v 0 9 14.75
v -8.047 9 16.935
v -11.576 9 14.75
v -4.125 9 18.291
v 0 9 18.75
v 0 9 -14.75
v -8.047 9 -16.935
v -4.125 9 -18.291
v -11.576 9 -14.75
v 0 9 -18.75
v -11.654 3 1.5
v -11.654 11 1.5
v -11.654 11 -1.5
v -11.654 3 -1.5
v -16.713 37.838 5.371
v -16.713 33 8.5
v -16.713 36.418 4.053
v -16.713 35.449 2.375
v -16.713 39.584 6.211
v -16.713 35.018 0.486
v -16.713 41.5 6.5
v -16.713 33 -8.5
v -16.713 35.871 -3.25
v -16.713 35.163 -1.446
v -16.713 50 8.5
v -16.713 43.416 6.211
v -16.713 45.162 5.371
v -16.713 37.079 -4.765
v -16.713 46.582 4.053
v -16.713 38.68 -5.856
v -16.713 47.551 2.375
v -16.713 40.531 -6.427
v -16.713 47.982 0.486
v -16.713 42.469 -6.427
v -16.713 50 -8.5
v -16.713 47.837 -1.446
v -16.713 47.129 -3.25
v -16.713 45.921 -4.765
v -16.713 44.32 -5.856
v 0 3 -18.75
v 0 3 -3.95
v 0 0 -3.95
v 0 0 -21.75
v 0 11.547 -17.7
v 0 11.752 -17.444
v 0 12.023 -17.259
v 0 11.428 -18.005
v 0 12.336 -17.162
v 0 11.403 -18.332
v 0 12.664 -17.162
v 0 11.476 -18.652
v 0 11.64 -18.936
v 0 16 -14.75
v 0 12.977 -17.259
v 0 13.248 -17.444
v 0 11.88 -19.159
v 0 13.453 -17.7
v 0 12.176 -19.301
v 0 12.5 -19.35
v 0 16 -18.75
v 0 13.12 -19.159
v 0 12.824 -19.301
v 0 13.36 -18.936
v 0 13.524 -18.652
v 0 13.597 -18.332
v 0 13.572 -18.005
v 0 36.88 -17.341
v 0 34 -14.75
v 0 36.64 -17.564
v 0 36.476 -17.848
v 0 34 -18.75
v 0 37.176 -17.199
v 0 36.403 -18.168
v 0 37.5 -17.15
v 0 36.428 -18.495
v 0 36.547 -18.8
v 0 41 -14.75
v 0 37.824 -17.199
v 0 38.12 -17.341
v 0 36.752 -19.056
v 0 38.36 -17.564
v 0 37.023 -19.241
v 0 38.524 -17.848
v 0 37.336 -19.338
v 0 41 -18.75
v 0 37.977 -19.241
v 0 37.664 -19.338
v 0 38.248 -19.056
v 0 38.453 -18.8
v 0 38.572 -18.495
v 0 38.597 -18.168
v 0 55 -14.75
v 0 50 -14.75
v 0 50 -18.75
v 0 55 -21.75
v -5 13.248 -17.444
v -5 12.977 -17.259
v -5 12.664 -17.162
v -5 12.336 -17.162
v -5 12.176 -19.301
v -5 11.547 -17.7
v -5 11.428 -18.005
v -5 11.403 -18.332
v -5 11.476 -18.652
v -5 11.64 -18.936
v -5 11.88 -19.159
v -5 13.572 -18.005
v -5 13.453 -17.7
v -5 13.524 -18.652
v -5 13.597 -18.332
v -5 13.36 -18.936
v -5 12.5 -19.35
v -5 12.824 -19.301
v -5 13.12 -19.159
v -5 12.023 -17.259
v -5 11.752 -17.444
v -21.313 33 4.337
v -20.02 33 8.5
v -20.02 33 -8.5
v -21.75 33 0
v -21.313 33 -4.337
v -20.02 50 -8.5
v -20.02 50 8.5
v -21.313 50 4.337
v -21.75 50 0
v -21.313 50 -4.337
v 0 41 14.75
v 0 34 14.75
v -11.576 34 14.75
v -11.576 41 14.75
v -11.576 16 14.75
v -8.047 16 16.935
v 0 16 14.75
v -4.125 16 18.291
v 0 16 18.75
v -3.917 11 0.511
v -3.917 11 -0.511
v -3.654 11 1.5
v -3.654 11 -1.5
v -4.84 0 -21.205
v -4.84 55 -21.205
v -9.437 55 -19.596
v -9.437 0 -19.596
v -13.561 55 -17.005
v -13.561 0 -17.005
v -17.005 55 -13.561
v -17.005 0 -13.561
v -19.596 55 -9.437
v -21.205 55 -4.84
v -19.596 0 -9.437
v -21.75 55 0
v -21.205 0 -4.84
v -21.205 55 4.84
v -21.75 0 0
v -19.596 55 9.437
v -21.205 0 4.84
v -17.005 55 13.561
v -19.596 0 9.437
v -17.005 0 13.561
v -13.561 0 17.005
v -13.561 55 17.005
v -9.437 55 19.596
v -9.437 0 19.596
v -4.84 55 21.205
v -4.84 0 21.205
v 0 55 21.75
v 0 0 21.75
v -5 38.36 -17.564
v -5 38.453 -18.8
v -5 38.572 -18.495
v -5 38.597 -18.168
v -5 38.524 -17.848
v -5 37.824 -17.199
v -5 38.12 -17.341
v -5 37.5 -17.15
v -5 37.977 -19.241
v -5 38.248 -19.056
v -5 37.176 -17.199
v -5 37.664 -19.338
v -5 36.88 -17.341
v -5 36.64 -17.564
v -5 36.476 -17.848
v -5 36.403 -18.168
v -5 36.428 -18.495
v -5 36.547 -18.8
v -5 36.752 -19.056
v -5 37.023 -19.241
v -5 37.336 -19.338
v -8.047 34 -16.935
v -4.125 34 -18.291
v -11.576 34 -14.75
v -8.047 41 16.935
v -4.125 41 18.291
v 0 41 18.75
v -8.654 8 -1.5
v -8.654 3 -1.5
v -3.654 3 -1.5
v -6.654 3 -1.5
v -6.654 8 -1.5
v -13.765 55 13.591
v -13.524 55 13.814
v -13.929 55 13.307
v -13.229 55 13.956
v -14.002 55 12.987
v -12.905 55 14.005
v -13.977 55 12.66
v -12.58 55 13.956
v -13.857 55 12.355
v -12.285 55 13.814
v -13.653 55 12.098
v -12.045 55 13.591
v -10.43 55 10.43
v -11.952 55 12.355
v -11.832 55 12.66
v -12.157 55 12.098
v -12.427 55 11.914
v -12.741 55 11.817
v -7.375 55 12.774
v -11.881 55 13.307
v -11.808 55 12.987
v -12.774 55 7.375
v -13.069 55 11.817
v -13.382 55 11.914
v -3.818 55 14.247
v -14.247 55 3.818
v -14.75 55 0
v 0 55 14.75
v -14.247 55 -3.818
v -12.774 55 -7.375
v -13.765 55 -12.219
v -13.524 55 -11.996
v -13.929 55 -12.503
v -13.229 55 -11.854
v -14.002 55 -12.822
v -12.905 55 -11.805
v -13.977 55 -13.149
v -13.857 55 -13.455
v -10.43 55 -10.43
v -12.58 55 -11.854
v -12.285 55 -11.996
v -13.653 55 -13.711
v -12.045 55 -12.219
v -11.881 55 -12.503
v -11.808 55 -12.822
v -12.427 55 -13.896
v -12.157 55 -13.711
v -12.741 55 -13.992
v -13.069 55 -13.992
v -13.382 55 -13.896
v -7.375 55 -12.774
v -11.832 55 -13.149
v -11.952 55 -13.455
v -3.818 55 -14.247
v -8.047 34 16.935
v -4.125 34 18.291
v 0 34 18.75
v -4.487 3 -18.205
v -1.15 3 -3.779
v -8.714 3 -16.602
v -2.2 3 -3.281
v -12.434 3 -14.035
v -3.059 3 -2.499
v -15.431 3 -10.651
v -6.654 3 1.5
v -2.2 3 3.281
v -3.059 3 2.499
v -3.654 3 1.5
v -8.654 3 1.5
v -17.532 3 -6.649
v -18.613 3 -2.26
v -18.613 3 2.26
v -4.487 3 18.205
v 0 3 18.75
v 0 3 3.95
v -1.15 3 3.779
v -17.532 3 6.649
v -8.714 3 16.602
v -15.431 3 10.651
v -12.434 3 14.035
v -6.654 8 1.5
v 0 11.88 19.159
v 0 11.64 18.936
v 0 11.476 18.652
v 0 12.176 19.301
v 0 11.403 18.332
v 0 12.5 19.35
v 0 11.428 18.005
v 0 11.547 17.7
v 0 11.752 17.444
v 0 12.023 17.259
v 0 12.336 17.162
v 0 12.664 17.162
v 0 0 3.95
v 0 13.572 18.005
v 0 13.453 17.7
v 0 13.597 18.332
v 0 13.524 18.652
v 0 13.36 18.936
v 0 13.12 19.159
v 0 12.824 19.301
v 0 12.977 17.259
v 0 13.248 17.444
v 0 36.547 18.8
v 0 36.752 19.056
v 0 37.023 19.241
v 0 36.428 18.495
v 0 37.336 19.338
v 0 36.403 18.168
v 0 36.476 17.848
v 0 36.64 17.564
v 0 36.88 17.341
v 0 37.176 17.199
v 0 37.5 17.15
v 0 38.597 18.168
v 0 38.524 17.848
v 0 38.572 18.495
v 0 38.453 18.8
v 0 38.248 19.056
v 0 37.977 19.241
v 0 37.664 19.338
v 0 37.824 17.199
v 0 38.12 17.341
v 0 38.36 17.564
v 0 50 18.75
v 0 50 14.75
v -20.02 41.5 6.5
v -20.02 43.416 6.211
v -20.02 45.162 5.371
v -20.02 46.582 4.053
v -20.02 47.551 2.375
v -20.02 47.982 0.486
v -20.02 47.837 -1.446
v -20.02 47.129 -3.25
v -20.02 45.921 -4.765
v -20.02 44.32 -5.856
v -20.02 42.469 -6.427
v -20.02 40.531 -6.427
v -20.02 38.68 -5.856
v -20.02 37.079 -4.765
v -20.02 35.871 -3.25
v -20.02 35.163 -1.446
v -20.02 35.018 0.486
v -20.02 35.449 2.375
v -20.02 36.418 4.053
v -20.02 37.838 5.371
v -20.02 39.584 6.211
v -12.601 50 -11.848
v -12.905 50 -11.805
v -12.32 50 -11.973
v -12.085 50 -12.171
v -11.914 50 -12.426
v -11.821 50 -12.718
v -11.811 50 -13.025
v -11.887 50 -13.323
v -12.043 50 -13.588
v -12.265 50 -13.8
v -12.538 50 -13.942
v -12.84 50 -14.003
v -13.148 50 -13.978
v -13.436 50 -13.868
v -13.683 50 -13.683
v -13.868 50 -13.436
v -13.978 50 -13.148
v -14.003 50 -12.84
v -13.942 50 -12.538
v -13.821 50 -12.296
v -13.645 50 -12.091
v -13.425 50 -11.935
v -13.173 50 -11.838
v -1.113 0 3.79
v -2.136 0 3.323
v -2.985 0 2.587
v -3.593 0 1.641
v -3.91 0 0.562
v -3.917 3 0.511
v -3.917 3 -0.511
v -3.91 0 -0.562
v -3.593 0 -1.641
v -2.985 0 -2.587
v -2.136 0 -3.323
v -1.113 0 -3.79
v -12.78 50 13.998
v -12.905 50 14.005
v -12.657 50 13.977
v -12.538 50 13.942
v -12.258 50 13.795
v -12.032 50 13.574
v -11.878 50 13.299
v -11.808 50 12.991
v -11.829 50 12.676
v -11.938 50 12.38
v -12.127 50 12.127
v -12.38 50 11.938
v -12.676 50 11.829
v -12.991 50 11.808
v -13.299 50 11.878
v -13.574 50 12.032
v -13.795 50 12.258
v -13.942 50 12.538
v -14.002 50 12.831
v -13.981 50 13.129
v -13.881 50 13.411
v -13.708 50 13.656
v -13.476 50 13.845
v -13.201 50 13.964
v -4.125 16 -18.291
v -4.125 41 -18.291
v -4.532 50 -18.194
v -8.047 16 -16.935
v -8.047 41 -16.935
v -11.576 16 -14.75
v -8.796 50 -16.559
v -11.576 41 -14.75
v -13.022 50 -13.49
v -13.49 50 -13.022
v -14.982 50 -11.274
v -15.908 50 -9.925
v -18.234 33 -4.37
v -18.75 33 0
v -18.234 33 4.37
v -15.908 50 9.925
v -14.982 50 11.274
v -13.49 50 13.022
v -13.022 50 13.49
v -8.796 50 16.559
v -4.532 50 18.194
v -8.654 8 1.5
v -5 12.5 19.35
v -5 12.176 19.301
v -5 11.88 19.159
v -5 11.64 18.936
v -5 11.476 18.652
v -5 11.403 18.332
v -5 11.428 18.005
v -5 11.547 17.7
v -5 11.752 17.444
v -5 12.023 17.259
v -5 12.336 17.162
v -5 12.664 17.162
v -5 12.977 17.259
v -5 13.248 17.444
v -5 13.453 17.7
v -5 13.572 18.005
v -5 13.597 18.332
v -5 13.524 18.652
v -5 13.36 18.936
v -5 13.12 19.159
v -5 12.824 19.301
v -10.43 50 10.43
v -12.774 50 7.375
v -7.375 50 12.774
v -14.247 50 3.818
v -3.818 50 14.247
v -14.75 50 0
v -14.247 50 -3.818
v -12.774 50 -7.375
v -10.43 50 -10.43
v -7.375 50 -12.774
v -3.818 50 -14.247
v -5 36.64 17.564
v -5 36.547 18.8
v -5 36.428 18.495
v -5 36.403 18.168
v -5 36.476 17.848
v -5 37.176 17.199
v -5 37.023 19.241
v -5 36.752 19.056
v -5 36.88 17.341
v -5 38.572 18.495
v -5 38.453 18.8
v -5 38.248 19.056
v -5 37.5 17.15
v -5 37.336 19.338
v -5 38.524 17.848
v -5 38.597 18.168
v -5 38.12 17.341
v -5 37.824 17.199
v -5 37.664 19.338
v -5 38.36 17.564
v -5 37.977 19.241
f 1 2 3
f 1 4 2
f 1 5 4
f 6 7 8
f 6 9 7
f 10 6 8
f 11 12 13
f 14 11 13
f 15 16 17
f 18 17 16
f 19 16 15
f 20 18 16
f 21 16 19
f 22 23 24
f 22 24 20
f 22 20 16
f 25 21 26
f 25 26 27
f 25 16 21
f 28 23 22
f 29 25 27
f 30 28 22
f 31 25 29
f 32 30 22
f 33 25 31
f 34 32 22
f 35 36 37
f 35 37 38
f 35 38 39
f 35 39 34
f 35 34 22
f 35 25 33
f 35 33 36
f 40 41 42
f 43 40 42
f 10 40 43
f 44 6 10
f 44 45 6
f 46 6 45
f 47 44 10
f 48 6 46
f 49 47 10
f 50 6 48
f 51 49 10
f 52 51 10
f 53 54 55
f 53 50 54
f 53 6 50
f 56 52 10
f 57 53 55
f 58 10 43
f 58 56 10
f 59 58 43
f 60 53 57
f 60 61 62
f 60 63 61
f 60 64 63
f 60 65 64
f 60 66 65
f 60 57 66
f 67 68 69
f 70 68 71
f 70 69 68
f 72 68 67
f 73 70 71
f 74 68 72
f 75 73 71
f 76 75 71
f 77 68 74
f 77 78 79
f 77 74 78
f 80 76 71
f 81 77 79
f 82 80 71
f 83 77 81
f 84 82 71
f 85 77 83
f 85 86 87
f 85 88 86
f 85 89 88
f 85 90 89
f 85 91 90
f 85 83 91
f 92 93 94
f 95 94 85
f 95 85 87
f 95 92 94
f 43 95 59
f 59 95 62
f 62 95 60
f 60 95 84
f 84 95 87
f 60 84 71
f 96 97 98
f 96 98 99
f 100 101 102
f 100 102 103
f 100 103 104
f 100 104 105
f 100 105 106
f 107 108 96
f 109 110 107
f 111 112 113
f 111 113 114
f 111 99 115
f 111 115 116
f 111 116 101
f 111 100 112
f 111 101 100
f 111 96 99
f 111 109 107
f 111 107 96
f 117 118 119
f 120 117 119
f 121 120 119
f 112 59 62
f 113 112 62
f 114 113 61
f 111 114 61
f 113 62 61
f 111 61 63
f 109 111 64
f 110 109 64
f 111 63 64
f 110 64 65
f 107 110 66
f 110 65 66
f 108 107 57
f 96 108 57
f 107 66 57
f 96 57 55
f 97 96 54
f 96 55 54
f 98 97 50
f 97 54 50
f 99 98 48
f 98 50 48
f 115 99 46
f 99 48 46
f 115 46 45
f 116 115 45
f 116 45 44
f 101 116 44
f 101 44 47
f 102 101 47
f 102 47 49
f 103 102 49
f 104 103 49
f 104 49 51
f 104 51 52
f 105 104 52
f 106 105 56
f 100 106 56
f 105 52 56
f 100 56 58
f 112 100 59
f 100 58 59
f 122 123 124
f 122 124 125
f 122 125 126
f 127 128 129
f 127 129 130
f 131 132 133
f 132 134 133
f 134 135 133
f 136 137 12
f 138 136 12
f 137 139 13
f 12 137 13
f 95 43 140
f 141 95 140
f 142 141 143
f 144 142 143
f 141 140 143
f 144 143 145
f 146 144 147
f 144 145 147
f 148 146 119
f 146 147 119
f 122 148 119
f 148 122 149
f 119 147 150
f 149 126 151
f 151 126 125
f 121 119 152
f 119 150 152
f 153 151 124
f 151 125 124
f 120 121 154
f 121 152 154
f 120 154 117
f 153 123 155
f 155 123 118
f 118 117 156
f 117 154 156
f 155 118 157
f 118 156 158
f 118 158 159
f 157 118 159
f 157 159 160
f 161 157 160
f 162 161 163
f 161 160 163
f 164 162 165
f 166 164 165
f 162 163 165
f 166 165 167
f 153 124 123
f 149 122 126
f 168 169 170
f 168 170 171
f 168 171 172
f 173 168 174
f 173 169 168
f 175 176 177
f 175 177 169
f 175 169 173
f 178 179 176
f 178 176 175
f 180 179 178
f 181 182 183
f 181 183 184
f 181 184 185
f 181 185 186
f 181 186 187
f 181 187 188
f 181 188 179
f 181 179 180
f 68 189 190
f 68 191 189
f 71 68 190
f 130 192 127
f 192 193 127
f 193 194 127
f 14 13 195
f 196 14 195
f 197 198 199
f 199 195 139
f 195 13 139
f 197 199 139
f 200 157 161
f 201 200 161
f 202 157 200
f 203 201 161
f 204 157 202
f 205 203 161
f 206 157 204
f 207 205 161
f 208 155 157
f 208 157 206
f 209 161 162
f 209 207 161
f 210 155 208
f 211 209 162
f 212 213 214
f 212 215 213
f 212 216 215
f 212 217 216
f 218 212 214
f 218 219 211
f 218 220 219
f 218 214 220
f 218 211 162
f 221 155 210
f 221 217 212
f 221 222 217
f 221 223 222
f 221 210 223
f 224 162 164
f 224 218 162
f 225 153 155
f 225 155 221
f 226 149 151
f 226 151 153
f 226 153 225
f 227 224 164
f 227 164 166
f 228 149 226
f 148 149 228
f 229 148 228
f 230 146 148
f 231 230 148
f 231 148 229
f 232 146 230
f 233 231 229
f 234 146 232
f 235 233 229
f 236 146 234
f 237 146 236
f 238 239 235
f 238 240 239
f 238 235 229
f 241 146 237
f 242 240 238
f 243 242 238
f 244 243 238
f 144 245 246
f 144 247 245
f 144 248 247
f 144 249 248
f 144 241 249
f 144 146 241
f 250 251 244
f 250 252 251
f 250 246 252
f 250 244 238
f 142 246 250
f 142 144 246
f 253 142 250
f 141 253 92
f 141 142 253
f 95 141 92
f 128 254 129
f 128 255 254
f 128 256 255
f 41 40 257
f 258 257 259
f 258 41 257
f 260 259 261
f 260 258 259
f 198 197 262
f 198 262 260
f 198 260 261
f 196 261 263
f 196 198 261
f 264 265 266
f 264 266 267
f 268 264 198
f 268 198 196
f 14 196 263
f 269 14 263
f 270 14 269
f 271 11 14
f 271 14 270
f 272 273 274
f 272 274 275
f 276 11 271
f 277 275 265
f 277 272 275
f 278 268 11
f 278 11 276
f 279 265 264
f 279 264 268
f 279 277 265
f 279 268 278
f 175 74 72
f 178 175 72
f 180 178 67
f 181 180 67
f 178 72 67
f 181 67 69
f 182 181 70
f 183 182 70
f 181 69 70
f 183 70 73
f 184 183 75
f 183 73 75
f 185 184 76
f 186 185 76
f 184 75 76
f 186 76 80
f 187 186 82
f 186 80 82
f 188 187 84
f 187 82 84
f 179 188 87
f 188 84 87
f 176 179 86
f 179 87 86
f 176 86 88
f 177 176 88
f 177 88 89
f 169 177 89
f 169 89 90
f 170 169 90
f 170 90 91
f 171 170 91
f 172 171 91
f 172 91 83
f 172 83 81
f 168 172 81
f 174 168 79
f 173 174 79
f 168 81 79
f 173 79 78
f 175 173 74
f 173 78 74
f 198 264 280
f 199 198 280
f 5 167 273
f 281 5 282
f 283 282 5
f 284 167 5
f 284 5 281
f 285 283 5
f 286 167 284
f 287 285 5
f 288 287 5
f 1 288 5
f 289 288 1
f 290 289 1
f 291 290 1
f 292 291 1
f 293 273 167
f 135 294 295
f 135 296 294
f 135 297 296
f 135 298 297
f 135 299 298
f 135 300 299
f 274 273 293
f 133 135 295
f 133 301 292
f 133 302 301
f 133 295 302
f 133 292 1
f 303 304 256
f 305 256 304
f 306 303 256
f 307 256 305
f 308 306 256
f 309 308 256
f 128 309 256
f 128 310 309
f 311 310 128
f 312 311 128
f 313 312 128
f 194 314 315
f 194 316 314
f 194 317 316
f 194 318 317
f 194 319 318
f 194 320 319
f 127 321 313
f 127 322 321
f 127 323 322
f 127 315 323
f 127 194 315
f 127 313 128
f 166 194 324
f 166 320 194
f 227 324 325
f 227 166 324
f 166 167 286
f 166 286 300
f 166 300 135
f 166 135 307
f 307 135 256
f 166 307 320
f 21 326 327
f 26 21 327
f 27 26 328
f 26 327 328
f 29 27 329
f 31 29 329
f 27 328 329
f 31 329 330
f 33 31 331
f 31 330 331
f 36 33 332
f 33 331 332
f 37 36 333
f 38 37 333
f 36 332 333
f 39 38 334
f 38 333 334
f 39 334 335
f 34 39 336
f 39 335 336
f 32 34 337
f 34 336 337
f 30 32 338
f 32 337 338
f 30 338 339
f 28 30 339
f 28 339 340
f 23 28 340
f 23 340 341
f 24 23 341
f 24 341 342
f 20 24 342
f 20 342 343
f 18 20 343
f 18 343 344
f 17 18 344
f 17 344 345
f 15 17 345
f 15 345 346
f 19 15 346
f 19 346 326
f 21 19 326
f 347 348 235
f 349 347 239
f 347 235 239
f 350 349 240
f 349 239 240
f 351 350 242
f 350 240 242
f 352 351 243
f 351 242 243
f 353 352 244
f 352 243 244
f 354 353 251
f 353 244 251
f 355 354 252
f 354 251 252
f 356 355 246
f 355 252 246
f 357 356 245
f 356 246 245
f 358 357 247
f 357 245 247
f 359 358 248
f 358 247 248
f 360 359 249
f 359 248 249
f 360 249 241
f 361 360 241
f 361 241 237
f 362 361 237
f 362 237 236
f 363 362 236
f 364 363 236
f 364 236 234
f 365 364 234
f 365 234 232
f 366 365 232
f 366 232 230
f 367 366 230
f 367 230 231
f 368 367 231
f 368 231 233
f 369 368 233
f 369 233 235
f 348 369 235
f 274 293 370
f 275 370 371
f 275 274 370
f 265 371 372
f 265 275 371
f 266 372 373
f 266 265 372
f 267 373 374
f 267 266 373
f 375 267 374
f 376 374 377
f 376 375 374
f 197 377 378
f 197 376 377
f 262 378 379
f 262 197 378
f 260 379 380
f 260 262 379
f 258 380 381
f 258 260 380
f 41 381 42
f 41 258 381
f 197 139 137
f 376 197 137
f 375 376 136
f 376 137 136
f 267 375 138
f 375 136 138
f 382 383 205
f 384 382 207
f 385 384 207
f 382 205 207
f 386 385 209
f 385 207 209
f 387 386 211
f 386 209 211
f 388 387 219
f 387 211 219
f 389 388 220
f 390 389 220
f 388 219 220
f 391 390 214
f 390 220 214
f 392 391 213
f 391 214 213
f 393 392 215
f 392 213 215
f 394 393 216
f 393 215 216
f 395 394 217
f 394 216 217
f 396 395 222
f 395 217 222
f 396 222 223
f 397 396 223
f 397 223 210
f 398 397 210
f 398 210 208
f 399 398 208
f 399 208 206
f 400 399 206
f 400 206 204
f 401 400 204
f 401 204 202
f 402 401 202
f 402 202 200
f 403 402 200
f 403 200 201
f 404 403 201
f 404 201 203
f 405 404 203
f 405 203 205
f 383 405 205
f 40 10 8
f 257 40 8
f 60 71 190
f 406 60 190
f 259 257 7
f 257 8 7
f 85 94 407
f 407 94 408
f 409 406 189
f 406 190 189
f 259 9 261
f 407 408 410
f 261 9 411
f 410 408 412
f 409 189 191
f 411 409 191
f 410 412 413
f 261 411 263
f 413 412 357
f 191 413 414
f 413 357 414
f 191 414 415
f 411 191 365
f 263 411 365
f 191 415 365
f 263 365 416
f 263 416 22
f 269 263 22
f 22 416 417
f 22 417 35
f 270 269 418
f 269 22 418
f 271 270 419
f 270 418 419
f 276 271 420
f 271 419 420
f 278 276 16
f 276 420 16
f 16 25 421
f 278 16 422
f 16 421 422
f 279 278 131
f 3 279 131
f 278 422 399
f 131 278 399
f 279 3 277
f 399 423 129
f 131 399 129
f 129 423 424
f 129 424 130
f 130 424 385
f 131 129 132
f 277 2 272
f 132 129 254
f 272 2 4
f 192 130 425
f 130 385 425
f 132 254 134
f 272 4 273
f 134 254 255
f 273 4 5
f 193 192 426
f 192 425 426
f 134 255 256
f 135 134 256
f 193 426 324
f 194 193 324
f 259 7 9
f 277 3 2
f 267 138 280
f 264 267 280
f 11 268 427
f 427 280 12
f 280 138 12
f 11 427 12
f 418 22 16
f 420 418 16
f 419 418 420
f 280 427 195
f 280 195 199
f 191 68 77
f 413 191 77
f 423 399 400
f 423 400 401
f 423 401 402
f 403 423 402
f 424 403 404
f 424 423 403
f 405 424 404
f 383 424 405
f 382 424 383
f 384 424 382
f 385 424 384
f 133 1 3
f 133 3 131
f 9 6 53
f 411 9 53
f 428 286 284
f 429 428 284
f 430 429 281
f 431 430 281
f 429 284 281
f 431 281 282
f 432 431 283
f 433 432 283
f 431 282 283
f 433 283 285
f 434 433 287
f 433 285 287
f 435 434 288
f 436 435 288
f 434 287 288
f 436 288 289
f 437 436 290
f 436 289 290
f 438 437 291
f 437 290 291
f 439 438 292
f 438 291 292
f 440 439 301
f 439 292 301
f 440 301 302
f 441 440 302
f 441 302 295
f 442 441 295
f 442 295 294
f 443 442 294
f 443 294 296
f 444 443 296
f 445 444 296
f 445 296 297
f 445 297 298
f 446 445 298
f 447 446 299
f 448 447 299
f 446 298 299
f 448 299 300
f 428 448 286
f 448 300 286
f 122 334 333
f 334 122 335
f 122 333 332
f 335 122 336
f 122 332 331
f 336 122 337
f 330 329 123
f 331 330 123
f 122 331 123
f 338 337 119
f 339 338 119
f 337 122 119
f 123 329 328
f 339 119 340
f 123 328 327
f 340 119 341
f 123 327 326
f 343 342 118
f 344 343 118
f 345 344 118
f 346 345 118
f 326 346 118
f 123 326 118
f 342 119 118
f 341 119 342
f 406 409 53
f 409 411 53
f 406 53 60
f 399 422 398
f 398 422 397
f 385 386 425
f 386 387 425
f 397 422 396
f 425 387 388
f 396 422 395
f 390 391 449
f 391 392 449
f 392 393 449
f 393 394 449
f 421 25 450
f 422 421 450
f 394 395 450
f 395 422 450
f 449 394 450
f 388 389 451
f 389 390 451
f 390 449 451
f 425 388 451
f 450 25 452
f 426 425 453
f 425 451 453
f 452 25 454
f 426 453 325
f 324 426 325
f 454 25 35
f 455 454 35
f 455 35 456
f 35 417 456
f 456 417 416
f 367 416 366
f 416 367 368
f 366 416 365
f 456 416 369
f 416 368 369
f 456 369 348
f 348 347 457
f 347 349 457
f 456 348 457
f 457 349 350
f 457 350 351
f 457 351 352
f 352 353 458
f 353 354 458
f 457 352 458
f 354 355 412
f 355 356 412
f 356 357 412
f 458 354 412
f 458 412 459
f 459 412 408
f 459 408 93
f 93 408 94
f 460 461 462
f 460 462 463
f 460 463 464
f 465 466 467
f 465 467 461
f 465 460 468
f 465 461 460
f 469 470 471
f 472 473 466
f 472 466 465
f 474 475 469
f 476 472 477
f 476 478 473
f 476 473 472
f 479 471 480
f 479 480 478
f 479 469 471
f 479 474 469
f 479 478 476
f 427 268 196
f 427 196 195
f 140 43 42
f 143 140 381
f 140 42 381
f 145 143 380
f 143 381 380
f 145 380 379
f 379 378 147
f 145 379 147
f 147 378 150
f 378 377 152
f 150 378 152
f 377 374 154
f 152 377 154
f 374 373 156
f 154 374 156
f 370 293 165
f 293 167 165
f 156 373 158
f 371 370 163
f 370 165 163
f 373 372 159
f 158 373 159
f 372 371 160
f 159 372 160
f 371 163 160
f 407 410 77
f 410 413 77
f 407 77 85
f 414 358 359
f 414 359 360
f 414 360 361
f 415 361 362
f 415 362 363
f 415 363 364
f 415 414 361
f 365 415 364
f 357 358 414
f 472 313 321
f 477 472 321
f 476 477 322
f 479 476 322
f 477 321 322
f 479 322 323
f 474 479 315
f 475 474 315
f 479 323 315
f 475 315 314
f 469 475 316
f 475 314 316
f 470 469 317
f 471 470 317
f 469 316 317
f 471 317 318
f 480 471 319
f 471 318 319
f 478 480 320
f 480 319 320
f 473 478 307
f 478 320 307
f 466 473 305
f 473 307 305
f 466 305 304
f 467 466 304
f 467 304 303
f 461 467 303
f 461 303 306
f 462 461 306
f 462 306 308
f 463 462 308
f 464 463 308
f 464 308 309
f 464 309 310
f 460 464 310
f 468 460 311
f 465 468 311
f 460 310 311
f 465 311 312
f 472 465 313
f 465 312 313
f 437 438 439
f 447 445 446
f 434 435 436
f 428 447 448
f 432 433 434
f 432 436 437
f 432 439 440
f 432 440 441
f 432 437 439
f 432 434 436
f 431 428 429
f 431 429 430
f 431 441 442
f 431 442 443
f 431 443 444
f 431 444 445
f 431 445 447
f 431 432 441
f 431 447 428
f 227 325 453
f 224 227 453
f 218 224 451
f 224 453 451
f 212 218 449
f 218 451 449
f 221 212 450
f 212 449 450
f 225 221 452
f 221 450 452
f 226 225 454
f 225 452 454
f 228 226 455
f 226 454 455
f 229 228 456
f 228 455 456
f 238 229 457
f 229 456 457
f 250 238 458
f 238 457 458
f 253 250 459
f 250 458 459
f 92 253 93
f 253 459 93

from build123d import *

# Parameters (mm, degrees)
EXTRUDE_1_DEPTH      = 55
CUT_EXTRUDE_START    = -5
SKETCH_2_R           = 18.75
SKETCH_2_R_2         = 14.75
CUT_EXTRUDE_1_DEPTH  = 59.016862823
EXTRUDE_3_REACH      = 65.017
EXTRUDE_3_END_RADIUS = 18.75
SKETCH_4_W           = 7
SKETCH_4_H           = 7
SKETCH_3_R           = 1.1
CUT_EXTRUDE_2_DEPTH  = 5
SKETCH_5_R           = 1.1
CUT_EXTRUDE_3_DEPTH  = 5
CUT_EXTRUDE_START_2  = -22
CUT_EXTRUDE_4_DEPTH  = 17
EXTRUDE_4_DEPTH      = 17
SKETCH_7_R           = 6.5
CUT_EXTRUDE_5_DEPTH  = 63.440972126
EXTRUDE_START        = -3
EXTRUDE_5_DEPTH      = 3
EXTRUDE_START_2      = 8
EXTRUDE_6_DEPTH      = 8
CUT_EXTRUDE_6_REACH  = 65.55
SKETCH_11_W          = 2
SKETCH_11_H          = 5


with BuildPart() as part:
    # ｽｹｯﾁ1 → ﾎﾞｽ - 押し出し1 (new body)
    with BuildSketch(Plane(origin=(0, 0, 0), x_dir=(1, 0, 0), z_dir=(0, 1, 0))):
        with BuildLine():
            Line((0, -21.75), (0, -14.75))
            ThreePointArc((0, -14.75), (-14.75, 0), (0, 14.75))
            Line((0, 14.75), (0, 21.75))
            ThreePointArc((0, 21.75), (-21.75, 0), (0, -21.75))
        make_face()
    extrude(amount=EXTRUDE_1_DEPTH)

    # ｽｹｯﾁ2 → ｶｯﾄ - 押し出し1 (cut, through all)
    with BuildSketch(Plane(origin=(0, 55, 0), x_dir=(1, 0, 0), z_dir=(0, 1, 0)).offset(CUT_EXTRUDE_START)):
        Circle(SKETCH_2_R)
        Circle(SKETCH_2_R_2, mode=Mode.SUBTRACT)
    extrude(amount=-CUT_EXTRUDE_1_DEPTH, mode=Mode.SUBTRACT)

    # ﾎﾞｽ - 押し出し3: up to this cylinder (the profile starts inside it)
    extrude_3_end = Plane(origin=(0, 25, 0), z_dir=(0, 1, 0)) * Cylinder(EXTRUDE_3_END_RADIUS, 193.534, mode=Mode.PRIVATE)
    # ｽｹｯﾁ4 → ﾎﾞｽ - 押し出し3 (add, up to the surface)
    with BuildSketch(Plane(origin=(0, 0, 0), x_dir=(0, 0, -1), z_dir=(1, 0, 0)), mode=Mode.PRIVATE) as extrude_3_sk1:
        with Locations((-18.25, 37.5)):
            Rectangle(SKETCH_4_W, SKETCH_4_H)
    extrude_3_tool1 = extrude(extrude_3_sk1.sketch, amount=-EXTRUDE_3_REACH, mode=Mode.PRIVATE) & extrude_3_end
    add(extrude_3_tool1.solids().sort_by_distance((0, 37.5, 18.25))[0])
    # ｽｹｯﾁ4 → ﾎﾞｽ - 押し出し3 (add, up to the surface)
    with BuildSketch(Plane(origin=(0, 0, 0), x_dir=(0, 0, -1), z_dir=(1, 0, 0)), mode=Mode.PRIVATE) as extrude_3_sk2:
        with Locations((-18.25, 12.5)):
            Rectangle(SKETCH_4_W, SKETCH_4_H)
    extrude_3_tool2 = extrude(extrude_3_sk2.sketch, amount=-EXTRUDE_3_REACH, mode=Mode.PRIVATE) & extrude_3_end
    add(extrude_3_tool2.solids().sort_by_distance((0, 12.5, 18.25))[0])
    # ｽｹｯﾁ4 → ﾎﾞｽ - 押し出し3 (add, up to the surface)
    with BuildSketch(Plane(origin=(0, 0, 0), x_dir=(0, 0, -1), z_dir=(1, 0, 0)), mode=Mode.PRIVATE) as extrude_3_sk3:
        with Locations((18.25, 12.5)):
            Rectangle(SKETCH_4_W, SKETCH_4_H)
    extrude_3_tool3 = extrude(extrude_3_sk3.sketch, amount=-EXTRUDE_3_REACH, mode=Mode.PRIVATE) & extrude_3_end
    add(extrude_3_tool3.solids().sort_by_distance((0, 12.5, -18.25))[0])
    # ｽｹｯﾁ4 → ﾎﾞｽ - 押し出し3 (add, up to the surface)
    with BuildSketch(Plane(origin=(0, 0, 0), x_dir=(0, 0, -1), z_dir=(1, 0, 0)), mode=Mode.PRIVATE) as extrude_3_sk4:
        with Locations((18.25, 37.5)):
            Rectangle(SKETCH_4_W, SKETCH_4_H)
    extrude_3_tool4 = extrude(extrude_3_sk4.sketch, amount=-EXTRUDE_3_REACH, mode=Mode.PRIVATE) & extrude_3_end
    add(extrude_3_tool4.solids().sort_by_distance((0, 37.5, -18.25))[0])

    # ｽｹｯﾁ3 → ｶｯﾄ - 押し出し2 (cut)
    with BuildSketch(Plane(origin=(0, 0, 0), x_dir=(0, 0, -1), z_dir=(1, 0, 0))):
        with Locations((-18.25, 37.5)):
            Circle(SKETCH_3_R)
        with Locations(Location((18.25, 37.5, 0), (0, 0, 180))):
            Circle(SKETCH_3_R)
        with Locations((18.25, 12.5)):
            Circle(SKETCH_3_R)
        with Locations(Location((-18.25, 12.5, 0), (0, 0, 180))):
            Circle(SKETCH_3_R)
    extrude(amount=-CUT_EXTRUDE_2_DEPTH, mode=Mode.SUBTRACT)

    # ｽｹｯﾁ5 → ｶｯﾄ - 押し出し3 (cut)
    with BuildSketch(Plane(origin=(0, 55, 0), x_dir=(1, 0, 0), z_dir=(0, 1, 0))):
        with Locations(Location((-12.904698757, -12.904698757, 0), (0, 0, 270))):
            Circle(SKETCH_5_R)
        with Locations(Location((-12.904698757, 12.904698757, 0), (0, 0, 270))):
            Circle(SKETCH_5_R)
    extrude(amount=-CUT_EXTRUDE_3_DEPTH, mode=Mode.SUBTRACT)

    # ｽｹｯﾁ6 → ｶｯﾄ - 押し出し4 (cut)
    with BuildSketch(Plane(origin=(0, 55, 0), x_dir=(1, 0, 0), z_dir=(0, 1, 0)).offset(CUT_EXTRUDE_START_2)):
        with BuildLine():
            Line((-20.020302196, 8.5), (-20.020302196, -8.5))
            ThreePointArc((-20.020302196, -8.5), (-21.75, 0), (-20.020302196, 8.5))
        make_face()
    extrude(amount=CUT_EXTRUDE_4_DEPTH, mode=Mode.SUBTRACT)

    # ｽｹｯﾁ8 → ﾎﾞｽ - 押し出し4 (add)
    with BuildSketch(Plane.XZ.offset(-50)):
        with BuildLine():
            Line((-16.712644913, 8.5), (-16.712644913, -8.5))
            ThreePointArc((-16.712644913, -8.5), (-18.75, 0), (-16.712644913, 8.5))
        make_face()
    extrude(amount=EXTRUDE_4_DEPTH)

    # ｽｹｯﾁ7 → ｶｯﾄ - 押し出し5 (cut, through all)
    with BuildSketch(Plane.ZY.offset(20.020302196)):
        with Locations((0, 41.5)):
            Circle(SKETCH_7_R)
    extrude(amount=-CUT_EXTRUDE_5_DEPTH, mode=Mode.SUBTRACT)

    # ｽｹｯﾁ9 → ﾎﾞｽ - 押し出し5 (add)
    with BuildSketch(Plane.XZ.offset(EXTRUDE_START)):
        with BuildLine():
            Line((0, 18.75), (0, 3.95))
            ThreePointArc((0, 3.95), (-3.95, 0), (0, -3.95))
            Line((0, -3.95), (0, -18.75))
            ThreePointArc((0, -18.75), (-18.75, 0), (0, 18.75))
        make_face()
    extrude(amount=EXTRUDE_5_DEPTH)

    # ｽｹｯﾁ10 → ﾎﾞｽ - 押し出し6 (add)
    with BuildSketch(Plane(origin=(0, 3, 0), x_dir=(1, 0, 0), z_dir=(0, 1, 0)).offset(EXTRUDE_START_2)):
        with BuildLine():
            Line((-3.654107278, -1.5), (-11.654107278, -1.5))
            Line((-11.654107278, -1.5), (-11.654107278, 1.5))
            Line((-11.654107278, 1.5), (-3.654107278, 1.5))
            ThreePointArc((-3.654107278, 1.5), (-3.95, 0), (-3.654107278, -1.5))
        make_face()
    extrude(amount=-EXTRUDE_6_DEPTH)

    # ｽｹｯﾁ11 → ｶｯﾄ - 押し出し6 (cut, up to next)
    with BuildSketch(Plane.XY.offset(1.5), mode=Mode.PRIVATE) as cut_extrude_6_sk1:
        with Locations((-7.654107278, 5.5)):
            Rectangle(SKETCH_11_W, SKETCH_11_H)
    cut_extrude_6_tool1 = extrude(cut_extrude_6_sk1.sketch, amount=-CUT_EXTRUDE_6_REACH, mode=Mode.PRIVATE) & part.part
    add(cut_extrude_6_tool1.solids().sort_by_distance((-7.654107, 5.5, 1.5))[0], mode=Mode.SUBTRACT)


solid = part.part
